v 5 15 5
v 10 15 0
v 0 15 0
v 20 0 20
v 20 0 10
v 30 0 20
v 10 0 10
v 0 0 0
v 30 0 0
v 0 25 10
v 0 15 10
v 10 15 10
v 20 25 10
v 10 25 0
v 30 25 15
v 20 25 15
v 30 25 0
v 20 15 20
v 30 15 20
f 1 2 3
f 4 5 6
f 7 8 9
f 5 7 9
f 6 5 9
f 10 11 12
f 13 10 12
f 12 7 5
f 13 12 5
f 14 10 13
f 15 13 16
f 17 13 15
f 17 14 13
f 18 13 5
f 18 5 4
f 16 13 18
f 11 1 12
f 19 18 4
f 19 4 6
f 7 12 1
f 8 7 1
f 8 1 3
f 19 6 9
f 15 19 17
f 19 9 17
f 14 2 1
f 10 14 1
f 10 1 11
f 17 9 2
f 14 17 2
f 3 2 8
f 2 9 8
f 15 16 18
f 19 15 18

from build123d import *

# Parameters (mm, degrees)
SKETCH1_W           = 30
SKETCH1_H           = 25
BOSS_EXTRUDE1_DEPTH = 20
SKETCH2_W           = 20
SKETCH2_H           = 25
CUT_EXTRUDE1_DEPTH  = 10
CUT_EXTRUDE2_DEPTH  = 20
CUT_EXTRUDE3_DEPTH  = 40
SKETCH5_W           = 20
SKETCH5_H           = 10
CUT_EXTRUDE4_DEPTH  = 20
BOSS_EXTRUDE2_DEPTH = 10


with BuildPart() as part:
    # Sketch1 → Boss-Extrude1 (new body)
    with BuildSketch(Plane.XY):
        with Locations((15, 12.5)):
            Rectangle(SKETCH1_W, SKETCH1_H)
    extrude(amount=BOSS_EXTRUDE1_DEPTH)

    # Sketch2 → Cut-Extrude1 (cut)
    with BuildSketch(Plane.XY.offset(20)):
        with Locations((10, 12.5)):
            Rectangle(SKETCH2_W, SKETCH2_H)
    extrude(amount=-CUT_EXTRUDE1_DEPTH, mode=Mode.SUBTRACT)

    # Sketch3 → Cut-Extrude2 (cut)
    with BuildSketch(Plane.ZY.offset(-20)):
        Polygon((15, 25), (20, 15), (20, 25), align=None)
    extrude(amount=-CUT_EXTRUDE2_DEPTH, mode=Mode.SUBTRACT)

    # Sketch4 → Cut-Extrude3 (cut)
    with BuildSketch(Plane(origin=(0, 25, 0), x_dir=(1, 0, 0), z_dir=(0, 1, 0))):
        Polygon((0, -10), (10, -10), (0, 0), align=None)
    extrude(amount=-CUT_EXTRUDE3_DEPTH, mode=Mode.SUBTRACT)

    # Sketch5 → Cut-Extrude4 (cut)
    with BuildSketch(Plane.ZY.offset(-20)):
        with Locations((0, 20)):
            Rectangle(SKETCH5_W, SKETCH5_H)
    extrude(amount=CUT_EXTRUDE4_DEPTH, mode=Mode.SUBTRACT)

    # Sketch6 → Boss-Extrude2 (add)
    with BuildSketch(Plane(origin=(0, 15, 0), x_dir=(1, 0, 0), z_dir=(0, 1, 0))):
        Polygon((0, -10), (20, -10), (20, 0), (10, 0), align=None)
    extrude(amount=BOSS_EXTRUDE2_DEPTH)


solid = part.part
